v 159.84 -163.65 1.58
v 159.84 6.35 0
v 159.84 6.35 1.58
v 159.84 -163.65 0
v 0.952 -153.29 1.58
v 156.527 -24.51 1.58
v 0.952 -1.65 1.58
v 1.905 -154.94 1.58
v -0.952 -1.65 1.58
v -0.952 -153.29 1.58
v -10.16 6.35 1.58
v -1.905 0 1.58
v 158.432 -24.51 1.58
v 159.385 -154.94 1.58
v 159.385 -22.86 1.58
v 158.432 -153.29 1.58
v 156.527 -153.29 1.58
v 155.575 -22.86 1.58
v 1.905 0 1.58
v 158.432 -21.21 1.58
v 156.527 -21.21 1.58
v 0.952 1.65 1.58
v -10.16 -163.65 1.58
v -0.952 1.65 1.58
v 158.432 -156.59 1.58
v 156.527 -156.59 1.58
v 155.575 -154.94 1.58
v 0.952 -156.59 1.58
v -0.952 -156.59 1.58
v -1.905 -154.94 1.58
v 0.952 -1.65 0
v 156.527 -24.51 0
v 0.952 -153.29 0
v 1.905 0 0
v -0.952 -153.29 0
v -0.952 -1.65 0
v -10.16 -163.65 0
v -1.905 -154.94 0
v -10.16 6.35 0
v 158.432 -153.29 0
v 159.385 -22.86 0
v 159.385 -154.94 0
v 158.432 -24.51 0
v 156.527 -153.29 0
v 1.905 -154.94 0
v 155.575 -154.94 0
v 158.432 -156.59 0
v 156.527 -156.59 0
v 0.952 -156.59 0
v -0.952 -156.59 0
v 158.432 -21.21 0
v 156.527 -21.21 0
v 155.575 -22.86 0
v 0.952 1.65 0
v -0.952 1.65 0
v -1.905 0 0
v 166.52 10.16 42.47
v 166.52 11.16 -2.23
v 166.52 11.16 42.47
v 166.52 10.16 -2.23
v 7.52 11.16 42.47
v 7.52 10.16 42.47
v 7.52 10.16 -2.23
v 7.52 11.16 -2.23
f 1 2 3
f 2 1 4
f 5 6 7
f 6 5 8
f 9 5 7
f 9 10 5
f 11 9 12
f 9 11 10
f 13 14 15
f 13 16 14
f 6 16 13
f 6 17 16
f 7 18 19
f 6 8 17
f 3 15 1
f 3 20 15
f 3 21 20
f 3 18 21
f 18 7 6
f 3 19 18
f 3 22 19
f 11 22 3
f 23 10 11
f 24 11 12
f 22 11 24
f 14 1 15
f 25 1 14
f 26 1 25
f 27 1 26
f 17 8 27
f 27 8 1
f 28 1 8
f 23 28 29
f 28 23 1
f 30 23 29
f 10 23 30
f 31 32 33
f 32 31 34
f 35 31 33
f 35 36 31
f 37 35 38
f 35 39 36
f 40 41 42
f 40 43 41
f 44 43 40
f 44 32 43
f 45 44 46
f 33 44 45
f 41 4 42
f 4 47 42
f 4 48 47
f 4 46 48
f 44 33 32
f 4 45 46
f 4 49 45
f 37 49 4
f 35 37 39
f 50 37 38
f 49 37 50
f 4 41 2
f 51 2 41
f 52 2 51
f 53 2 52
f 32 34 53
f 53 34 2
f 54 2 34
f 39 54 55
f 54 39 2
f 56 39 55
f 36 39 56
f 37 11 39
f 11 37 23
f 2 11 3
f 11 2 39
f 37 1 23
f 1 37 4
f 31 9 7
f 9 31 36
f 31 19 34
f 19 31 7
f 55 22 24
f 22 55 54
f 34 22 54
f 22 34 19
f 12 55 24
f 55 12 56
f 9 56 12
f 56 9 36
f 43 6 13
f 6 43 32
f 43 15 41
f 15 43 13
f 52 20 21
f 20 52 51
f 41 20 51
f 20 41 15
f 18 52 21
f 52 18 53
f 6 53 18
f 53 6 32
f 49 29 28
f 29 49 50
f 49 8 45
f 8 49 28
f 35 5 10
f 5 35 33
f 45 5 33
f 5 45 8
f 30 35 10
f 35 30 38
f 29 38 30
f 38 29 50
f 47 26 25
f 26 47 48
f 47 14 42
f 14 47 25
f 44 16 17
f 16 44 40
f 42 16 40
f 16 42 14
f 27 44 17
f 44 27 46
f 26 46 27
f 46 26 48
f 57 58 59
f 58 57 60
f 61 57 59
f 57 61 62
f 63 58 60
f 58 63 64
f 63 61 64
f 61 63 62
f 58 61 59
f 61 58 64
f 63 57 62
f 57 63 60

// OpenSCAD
difference() {
	translate([-10.16, 6.35-170, 0])cube([170,170,1.58]); // The datum is the C mount point.
	translate([0,0,-5])cylinder(d=3.81, h=10); // Mount hole C   holes are 0.15in
	translate([157.48,-22.86,-5])cylinder(d=3.81, h=10); // Mount hole F
	translate([0,-154.94,-5])cylinder(d=3.81, h=10); // Mount hole H
	translate([157.48,-154.94,-5])cylinder(d=3.81, h=10); // Mount hole J
};
color("grey")translate([7.52,10.16,7.3-9.53])cube([159,1,44.7]); // IO cutout
